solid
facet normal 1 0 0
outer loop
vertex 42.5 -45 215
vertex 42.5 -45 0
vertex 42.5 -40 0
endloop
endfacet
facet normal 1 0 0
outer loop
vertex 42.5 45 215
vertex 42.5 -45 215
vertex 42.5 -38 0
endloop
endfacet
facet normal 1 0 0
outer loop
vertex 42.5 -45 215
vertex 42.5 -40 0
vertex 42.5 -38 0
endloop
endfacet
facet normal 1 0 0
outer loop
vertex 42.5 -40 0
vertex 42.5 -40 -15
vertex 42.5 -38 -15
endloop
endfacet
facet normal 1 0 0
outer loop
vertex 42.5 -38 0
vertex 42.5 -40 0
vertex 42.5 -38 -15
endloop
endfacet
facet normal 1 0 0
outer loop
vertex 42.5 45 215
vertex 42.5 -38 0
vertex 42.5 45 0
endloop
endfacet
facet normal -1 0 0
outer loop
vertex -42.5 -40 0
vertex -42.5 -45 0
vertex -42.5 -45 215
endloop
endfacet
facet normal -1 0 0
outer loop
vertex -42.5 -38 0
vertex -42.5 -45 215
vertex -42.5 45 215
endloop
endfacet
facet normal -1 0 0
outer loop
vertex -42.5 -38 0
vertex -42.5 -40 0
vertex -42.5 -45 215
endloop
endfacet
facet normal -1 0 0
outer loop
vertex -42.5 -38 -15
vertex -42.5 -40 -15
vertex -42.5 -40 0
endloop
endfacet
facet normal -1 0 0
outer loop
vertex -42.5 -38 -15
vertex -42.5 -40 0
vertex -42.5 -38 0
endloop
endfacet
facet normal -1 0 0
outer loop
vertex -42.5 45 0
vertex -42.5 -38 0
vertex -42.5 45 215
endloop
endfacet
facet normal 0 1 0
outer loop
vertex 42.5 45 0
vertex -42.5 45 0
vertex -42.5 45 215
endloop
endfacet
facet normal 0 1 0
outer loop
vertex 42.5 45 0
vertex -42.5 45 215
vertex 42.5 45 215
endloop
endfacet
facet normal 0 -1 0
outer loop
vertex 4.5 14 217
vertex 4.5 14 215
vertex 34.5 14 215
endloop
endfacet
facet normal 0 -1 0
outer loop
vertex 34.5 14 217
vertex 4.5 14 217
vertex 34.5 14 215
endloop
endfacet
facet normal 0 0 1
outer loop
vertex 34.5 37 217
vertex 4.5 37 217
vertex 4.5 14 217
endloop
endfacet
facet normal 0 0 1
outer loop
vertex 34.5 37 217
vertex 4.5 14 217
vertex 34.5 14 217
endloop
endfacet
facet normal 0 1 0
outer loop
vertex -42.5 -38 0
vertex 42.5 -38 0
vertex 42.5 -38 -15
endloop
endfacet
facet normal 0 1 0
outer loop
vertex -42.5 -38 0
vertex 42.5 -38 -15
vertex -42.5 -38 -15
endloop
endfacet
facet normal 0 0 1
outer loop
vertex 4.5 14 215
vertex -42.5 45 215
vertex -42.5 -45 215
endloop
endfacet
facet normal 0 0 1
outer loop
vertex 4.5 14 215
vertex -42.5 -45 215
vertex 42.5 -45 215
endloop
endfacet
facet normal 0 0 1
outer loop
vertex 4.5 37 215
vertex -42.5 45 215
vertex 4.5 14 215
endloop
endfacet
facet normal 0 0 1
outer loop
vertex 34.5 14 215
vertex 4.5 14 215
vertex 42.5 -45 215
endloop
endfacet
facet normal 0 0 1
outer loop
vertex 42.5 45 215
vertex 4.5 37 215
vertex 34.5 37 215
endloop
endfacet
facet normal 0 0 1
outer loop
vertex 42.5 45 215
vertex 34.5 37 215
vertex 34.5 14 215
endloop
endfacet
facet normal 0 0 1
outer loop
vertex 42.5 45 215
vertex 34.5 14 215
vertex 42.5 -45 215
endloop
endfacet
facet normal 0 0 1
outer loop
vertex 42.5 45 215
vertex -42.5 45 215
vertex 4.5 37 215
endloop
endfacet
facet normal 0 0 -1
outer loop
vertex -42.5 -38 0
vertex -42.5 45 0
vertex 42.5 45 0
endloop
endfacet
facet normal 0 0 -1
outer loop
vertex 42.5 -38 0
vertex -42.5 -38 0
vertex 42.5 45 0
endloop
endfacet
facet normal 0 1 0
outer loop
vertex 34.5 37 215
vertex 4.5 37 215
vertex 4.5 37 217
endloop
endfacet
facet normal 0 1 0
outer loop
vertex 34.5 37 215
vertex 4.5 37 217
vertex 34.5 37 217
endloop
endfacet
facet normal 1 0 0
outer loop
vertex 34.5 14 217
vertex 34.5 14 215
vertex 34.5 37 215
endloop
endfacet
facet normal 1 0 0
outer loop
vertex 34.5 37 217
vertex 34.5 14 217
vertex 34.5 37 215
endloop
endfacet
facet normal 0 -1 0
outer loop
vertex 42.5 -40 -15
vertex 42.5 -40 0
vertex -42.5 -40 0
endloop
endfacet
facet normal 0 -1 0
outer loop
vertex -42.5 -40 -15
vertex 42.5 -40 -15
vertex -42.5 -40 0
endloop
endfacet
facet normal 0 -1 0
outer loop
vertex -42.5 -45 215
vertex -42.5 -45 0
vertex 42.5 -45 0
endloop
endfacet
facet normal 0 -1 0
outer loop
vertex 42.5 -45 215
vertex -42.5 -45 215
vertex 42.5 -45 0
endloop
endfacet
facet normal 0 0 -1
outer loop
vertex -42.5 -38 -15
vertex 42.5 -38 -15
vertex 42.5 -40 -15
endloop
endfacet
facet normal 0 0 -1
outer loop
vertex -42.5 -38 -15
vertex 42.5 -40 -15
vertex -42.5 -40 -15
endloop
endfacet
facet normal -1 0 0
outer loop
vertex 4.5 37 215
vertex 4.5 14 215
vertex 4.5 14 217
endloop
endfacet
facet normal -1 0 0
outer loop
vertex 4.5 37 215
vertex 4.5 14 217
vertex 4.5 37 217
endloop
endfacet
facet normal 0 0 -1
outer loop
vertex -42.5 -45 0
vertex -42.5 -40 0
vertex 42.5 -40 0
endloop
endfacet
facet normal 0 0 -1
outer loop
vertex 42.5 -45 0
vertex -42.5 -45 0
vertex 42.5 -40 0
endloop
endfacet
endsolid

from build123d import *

# Parameters (mm, degrees)
SZKIC1_W                    = 85
SZKIC1_H                    = 90
DODANIE_WYCI_GNI_CIE1_DEPTH = 215
SZKIC2_W                    = 85
SZKIC2_H                    = 2
DODANIE_WYCI_GNI_CIE2_DEPTH = 15
SZKIC3_W                    = 30
SZKIC3_H                    = 23
DODANIE_WYCI_GNI_CIE3_DEPTH = 2


with BuildPart() as part:
    # Szkic1 → Dodanie-wyciągnięcie1 (new body)
    with BuildSketch(Plane.XY):
        Rectangle(SZKIC1_W, SZKIC1_H)
    extrude(amount=DODANIE_WYCI_GNI_CIE1_DEPTH)

    # Szkic2 → Dodanie-wyciągnięcie2 (add)
    with BuildSketch(Plane(origin=(0, 0, 0), x_dir=(-1, 0, 0), z_dir=(0, 0, -1))):
        with Locations((0, -39)):
            Rectangle(SZKIC2_W, SZKIC2_H)
    extrude(amount=DODANIE_WYCI_GNI_CIE2_DEPTH)

    # Szkic3 → Dodanie-wyciągnięcie3 (add)
    with BuildSketch(Plane.XY.offset(215)):
        with Locations((19.5, 25.5)):
            Rectangle(SZKIC3_W, SZKIC3_H)
    extrude(amount=DODANIE_WYCI_GNI_CIE3_DEPTH)


solid = part.part
